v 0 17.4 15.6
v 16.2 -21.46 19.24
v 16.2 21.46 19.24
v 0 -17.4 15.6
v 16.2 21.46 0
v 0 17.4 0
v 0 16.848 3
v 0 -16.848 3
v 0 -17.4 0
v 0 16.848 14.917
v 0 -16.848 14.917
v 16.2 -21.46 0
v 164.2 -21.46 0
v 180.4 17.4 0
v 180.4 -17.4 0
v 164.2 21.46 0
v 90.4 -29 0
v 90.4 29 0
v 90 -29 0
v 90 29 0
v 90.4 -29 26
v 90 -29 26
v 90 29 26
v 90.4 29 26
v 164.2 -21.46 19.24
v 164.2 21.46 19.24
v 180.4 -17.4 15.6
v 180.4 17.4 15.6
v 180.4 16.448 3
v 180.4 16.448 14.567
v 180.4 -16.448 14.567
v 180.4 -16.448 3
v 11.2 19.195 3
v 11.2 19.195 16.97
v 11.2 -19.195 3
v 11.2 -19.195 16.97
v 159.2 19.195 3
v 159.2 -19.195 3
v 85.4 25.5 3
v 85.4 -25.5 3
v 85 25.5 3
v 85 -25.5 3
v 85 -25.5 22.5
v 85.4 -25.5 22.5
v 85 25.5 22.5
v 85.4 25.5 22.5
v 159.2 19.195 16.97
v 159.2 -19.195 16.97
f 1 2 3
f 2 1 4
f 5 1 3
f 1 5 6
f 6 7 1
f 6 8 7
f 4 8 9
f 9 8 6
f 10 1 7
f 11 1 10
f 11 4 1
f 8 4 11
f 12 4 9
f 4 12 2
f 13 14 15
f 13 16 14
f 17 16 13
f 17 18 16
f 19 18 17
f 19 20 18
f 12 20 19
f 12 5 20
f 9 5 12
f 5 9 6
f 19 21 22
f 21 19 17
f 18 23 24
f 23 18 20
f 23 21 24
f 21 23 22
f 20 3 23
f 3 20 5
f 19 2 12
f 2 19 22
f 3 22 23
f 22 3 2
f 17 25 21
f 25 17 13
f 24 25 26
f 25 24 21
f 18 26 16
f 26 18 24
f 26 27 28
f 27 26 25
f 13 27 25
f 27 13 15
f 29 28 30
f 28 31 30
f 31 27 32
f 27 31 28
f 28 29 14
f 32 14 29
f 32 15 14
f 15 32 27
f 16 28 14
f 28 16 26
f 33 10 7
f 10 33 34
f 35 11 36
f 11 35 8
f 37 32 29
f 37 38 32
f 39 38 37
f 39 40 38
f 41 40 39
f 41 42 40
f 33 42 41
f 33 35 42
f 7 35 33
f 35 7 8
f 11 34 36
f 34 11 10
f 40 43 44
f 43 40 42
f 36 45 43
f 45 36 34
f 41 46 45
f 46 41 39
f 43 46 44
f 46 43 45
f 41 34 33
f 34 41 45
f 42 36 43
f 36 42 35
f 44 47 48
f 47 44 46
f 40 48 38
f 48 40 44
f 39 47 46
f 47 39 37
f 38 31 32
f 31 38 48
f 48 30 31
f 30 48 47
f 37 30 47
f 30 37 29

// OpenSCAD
$fn = 32;

// ----------------------------------------------------------------------
// Faired channel: 180 x 58 x 26 mm, 3.5 mm walls, faired ends
// ----------------------------------------------------------------------

// --- parameters (mm) ---
length = 180;             // channel length
width = 58;               // channel width at mid length
height = 26;              // channel height at mid length
wall = 3.5;               // side wall thickness
floor_t = 3;              // floor thickness
end_w = 34.8;             // faired end width
end_h = 15.6;             // faired end height

difference() {
  union() {
    hull() {
      translate([0, -17.4, 0]) cube([0.4, 34.8, 15.6]);
      translate([16.2, -21.46, 0]) cube([0.4, 42.92, 19.24]);
    }
    hull() {
      translate([16.2, -21.46, 0]) cube([0.4, 42.92, 19.24]);
      translate([90, -29, 0]) cube([0.4, 58, 26]);
    }
    hull() {
      translate([90, -29, 0]) cube([0.4, 58, 26]);
      translate([163.8, -21.46, 0]) cube([0.4, 42.92, 19.24]);
    }
    hull() {
      translate([163.8, -21.46, 0]) cube([0.4, 42.92, 19.24]);
      translate([180, -17.4, 0]) cube([0.4, 34.8, 15.6]);
    }
  }
  /* cavity, 5 mm proud of both ends so the ports are cut clean */
  hull() {
    translate([-5, -15.8, 3]) cube([0.4, 31.6, 11]);
    translate([11.2, -19.195, 3]) cube([0.4, 38.39, 13.97]);
  }
  hull() {
    translate([11.2, -19.195, 3]) cube([0.4, 38.39, 13.97]);
    translate([85, -25.5, 3]) cube([0.4, 51, 19.5]);
  }
  hull() {
    translate([85, -25.5, 3]) cube([0.4, 51, 19.5]);
    translate([158.8, -19.195, 3]) cube([0.4, 38.39, 13.97]);
  }
  hull() {
    translate([158.8, -19.195, 3]) cube([0.4, 38.39, 13.97]);
    translate([185, -15.8, 3]) cube([0.4, 31.6, 11]);
  }
}
